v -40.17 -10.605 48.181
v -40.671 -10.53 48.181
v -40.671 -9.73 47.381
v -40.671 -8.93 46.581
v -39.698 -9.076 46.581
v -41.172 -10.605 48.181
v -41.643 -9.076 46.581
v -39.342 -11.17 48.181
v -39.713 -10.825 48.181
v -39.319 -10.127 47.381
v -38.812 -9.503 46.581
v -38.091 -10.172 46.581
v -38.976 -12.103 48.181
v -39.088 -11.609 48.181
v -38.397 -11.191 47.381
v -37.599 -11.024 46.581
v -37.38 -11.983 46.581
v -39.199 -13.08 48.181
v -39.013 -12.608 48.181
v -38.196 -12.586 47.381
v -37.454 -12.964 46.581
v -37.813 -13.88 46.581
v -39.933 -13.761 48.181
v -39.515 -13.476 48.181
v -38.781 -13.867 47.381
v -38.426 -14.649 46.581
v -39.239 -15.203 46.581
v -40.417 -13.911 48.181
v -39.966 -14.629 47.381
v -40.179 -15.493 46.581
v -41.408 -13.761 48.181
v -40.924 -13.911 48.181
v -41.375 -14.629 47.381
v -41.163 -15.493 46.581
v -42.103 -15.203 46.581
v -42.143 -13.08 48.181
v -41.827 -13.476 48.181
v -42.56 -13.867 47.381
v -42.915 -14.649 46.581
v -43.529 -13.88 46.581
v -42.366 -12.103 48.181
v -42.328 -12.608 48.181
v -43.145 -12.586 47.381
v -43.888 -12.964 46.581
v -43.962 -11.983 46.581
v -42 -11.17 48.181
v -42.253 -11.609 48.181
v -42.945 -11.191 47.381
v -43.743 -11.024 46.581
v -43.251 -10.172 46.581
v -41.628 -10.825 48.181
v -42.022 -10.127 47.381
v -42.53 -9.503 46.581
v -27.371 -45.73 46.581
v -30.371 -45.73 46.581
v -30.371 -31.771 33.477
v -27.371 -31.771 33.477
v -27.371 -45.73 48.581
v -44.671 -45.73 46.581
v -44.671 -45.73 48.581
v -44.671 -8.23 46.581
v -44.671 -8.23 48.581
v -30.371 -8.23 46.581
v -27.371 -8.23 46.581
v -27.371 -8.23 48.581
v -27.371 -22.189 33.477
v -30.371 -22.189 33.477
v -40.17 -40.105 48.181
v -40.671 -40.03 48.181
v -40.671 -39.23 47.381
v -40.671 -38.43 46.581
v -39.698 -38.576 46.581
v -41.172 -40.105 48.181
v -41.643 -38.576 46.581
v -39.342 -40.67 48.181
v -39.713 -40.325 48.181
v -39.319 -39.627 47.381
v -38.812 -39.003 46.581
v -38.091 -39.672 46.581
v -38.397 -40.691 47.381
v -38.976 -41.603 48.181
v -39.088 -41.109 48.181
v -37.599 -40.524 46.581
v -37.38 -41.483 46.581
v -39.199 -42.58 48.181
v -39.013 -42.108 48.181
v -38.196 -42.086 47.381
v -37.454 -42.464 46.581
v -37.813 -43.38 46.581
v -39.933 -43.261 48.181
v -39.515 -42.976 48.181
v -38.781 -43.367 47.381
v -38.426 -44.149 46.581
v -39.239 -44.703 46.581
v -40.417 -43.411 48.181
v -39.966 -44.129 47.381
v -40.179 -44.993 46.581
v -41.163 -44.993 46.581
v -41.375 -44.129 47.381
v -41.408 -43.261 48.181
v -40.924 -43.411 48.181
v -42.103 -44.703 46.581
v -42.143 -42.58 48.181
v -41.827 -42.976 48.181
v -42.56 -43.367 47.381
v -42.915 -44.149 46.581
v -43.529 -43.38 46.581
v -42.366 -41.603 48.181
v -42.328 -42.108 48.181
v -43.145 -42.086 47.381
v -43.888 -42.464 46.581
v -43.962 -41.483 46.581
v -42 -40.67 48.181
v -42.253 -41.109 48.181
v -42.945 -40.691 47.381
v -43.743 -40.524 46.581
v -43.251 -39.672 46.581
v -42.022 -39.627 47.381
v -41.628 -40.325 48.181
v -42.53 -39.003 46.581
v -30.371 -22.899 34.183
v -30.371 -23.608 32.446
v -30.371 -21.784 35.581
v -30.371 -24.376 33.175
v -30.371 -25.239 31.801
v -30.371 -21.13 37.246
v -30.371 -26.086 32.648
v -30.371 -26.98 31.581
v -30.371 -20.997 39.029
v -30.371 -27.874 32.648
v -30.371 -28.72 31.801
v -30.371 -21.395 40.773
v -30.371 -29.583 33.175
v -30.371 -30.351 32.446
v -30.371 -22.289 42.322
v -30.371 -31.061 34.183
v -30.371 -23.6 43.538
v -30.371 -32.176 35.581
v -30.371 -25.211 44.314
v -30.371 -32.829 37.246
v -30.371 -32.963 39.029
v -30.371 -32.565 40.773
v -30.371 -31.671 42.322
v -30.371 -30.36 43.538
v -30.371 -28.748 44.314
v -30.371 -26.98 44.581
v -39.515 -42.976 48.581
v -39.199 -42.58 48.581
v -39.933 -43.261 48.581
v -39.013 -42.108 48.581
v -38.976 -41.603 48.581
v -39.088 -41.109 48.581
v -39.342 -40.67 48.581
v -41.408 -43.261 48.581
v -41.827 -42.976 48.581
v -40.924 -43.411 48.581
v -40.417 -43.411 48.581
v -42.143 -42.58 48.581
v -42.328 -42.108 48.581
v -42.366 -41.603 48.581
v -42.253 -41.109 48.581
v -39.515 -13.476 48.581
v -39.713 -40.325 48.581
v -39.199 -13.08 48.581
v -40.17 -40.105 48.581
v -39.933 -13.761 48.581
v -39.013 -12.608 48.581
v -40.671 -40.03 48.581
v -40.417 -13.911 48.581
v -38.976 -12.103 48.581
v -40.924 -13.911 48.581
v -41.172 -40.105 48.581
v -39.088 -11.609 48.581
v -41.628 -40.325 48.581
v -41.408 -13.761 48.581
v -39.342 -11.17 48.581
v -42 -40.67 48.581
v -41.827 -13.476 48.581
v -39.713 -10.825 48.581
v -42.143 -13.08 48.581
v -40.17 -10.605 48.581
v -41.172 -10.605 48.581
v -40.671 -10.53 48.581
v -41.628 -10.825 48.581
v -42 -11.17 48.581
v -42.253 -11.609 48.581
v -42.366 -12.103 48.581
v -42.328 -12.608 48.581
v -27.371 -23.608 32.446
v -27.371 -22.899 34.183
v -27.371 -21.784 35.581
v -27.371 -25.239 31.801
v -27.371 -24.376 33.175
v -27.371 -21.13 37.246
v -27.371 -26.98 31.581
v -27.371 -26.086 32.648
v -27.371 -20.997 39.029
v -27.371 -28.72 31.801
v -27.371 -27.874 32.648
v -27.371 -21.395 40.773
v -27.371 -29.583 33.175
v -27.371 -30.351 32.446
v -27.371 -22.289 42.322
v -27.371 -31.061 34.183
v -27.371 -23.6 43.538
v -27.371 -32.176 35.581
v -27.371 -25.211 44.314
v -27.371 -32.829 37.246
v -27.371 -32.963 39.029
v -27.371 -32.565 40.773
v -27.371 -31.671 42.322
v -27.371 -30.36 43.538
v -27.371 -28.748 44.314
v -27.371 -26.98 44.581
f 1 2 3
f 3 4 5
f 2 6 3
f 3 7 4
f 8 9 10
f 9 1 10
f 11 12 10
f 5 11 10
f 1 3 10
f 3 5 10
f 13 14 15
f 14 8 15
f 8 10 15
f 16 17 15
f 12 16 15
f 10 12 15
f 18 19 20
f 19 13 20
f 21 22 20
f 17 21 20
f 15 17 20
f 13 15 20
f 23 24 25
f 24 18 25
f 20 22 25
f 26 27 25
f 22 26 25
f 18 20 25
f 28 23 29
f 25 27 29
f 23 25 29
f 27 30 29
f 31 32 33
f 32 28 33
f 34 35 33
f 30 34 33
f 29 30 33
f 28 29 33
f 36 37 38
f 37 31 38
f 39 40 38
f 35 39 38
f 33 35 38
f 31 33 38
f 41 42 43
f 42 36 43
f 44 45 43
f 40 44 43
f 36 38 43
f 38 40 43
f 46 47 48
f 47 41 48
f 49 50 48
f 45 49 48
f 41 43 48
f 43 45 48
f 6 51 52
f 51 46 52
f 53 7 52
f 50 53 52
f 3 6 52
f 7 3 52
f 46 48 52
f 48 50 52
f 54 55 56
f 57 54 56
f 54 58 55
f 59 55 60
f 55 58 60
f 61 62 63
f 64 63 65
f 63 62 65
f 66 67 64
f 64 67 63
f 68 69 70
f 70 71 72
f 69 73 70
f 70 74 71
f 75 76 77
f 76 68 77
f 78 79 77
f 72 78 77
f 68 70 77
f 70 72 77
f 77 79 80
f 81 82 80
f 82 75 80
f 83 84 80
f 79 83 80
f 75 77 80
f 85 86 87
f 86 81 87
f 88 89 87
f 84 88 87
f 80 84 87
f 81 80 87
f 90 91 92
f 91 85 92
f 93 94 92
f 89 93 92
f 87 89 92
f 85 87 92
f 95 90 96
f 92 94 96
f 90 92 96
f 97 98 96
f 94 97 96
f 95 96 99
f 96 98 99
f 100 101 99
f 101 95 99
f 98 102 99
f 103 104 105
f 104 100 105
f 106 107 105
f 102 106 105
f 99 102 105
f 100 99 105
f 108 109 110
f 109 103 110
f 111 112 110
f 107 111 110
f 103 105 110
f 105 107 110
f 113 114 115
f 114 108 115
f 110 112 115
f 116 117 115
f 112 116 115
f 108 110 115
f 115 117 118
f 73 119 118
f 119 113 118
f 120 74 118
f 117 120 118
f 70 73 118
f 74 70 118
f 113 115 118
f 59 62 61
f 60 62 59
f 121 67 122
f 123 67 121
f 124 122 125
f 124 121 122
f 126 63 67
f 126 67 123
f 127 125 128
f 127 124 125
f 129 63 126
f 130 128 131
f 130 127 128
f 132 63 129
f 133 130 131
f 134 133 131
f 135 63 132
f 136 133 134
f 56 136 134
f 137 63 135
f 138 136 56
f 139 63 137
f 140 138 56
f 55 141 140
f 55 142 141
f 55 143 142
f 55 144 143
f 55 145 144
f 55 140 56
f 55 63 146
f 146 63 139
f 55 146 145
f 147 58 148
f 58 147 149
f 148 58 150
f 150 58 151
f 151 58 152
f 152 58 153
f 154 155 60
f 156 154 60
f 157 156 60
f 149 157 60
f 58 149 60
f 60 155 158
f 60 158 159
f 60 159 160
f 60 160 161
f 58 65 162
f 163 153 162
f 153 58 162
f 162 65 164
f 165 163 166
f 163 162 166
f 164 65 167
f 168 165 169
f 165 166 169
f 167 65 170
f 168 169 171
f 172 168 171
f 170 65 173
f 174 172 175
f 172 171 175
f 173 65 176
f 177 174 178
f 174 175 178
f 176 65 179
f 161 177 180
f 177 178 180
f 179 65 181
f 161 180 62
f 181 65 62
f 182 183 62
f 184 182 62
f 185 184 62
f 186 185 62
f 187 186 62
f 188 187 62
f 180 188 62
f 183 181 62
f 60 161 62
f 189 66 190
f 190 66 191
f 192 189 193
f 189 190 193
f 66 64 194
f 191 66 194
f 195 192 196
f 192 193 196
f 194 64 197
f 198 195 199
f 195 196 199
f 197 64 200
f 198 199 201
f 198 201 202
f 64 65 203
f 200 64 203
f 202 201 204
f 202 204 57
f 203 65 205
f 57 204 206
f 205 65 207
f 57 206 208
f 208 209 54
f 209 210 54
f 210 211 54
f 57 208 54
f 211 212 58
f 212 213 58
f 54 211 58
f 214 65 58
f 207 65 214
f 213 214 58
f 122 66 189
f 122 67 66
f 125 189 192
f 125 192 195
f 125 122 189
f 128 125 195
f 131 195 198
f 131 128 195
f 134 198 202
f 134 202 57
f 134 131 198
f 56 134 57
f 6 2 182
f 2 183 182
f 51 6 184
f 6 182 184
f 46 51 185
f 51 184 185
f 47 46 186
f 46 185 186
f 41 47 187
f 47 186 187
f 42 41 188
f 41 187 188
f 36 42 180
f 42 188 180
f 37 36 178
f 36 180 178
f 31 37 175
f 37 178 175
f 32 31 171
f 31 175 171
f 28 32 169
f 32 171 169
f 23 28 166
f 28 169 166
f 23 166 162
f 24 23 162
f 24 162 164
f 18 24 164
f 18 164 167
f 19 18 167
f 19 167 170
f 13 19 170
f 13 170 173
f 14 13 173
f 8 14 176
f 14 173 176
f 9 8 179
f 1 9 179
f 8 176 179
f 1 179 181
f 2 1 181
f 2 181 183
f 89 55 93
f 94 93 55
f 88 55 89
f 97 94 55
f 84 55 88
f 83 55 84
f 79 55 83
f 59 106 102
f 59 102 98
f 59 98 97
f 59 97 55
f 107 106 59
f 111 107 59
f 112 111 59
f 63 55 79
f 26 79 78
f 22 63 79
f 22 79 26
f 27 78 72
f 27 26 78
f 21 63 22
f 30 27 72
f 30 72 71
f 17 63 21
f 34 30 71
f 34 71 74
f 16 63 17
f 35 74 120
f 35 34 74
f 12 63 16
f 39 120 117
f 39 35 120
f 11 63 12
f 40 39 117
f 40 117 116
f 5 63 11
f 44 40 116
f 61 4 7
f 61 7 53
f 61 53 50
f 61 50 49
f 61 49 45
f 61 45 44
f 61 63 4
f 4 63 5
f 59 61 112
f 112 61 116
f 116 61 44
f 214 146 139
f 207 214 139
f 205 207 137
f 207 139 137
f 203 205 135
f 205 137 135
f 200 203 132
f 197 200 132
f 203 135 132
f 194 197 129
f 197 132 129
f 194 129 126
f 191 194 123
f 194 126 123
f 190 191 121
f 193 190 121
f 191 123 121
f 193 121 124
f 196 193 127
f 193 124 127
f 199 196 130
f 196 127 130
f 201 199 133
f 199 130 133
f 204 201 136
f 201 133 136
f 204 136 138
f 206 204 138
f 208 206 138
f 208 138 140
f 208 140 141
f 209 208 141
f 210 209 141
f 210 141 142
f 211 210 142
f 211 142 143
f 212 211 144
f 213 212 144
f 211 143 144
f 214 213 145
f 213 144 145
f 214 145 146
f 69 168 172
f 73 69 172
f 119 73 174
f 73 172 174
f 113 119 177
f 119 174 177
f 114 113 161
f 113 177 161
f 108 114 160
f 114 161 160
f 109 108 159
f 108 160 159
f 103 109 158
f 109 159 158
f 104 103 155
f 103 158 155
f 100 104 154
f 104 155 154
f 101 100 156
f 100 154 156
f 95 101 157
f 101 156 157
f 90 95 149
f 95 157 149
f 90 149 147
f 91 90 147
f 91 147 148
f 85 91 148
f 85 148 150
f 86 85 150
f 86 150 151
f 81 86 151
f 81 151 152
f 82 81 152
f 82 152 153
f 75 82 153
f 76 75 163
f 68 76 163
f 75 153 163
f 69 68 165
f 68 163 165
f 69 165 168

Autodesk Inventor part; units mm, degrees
ref_plane "YZ Plane" through (0, 0, 0) normal (1, 0, 0) x (0, 1, 0)
ref_plane "XZ Plane" through (0, 0, 0) normal (0, 1, 0) x (-1, 0, 0)
ref_plane "XY Plane" through (0, 0, 0) normal (0, 0, 1) x (1, 0, 0)
ref_plane "Work Plane1" through (-14.6708, -27.7298, 48.581) normal (0, 0, -1) x (-1, 0, 0)
sketch "Sketch1" plane through (-14.6708, -27.7298, 48.581) normal (0, 0, -1) x (-1, 0, 0)
  circle A0 centre (26, 15.5) radius 3.3 projected
  circle A1 centre (26, -14) radius 3.3 projected
  line L0 (12.7, 19.5) -> (30, 19.5)
  line L1 (30, 19.5) -> (30, -18)
  line L2 (30, -18) -> (12.7, -18)
  line L3 (12.7, -18) -> (12.7, 19.5)
  line L4 (15.7, 19.5) -> (15.7, -18)
  point P0 (-14.6708, 27.7298)
  dimension "d0" = 4
  dimension "d1" = 4
  dimension "d2" = 4
  dimension "d3" = 10
  dimension "d4" = 3
extrude "Extrusion1" add sketch "Sketch1" along normal blind 2 contours A0 | A1 | L0 L4 L2 L3 | L0 L1 L2 L4
sketch "Sketch2" plane through (-14.6708, -27.7298, 46.581) normal (0, 0, -1) x (-1, 0, 0)
  line L0 (15.7, 19.5) -> (15.7, -18) projected
  line L1 (12.7, 19.5) -> (12.7, -18) projected
  circle A0 centre (26, 15.5) radius 3.3 projected
  circle A1 centre (26, -14) radius 3.3 projected
  line L2 (30, 19.5) -> (12.7, 19.5) projected
  line L3 (12.7, -18) -> (30, -18) projected
  point P0 (-14.6708, 27.7298)
hole "Hole1" at (-40.6708, -12.2298, 46.581) at (-40.6708, -41.7298, 46.581) direction (0, 0, 1) diameter 3.4 end through all countersink diameter 6.6 countersink angle 90 clearance for "Countersunk Head GOST 12876-67" size "M3" standard "GOST"
sketch "Sketch3" plane through (-14.6708, -27.7298, 46.581) normal (0, 0, -1) x (-1, 0, 0)
  line L0 (30, 19.5) -> (12.7, 19.5) projected
  line L1 (12.7, 19.5) -> (12.7, -18) projected
  line L2 (15.7, 19.5) -> (15.7, -18) projected
  line L3 (12.7, -18) -> (30, -18) projected
  point P0 (-14.6708, 27.7298)
extrude "Extrusion2" add sketch "Sketch3" along normal blind 62.25
sketch "Sketch4" plane through (-30.3708, -45.7298, 46.581) normal (-1, 0, 0) x (0, 0, 1)
  line L0 (2, 0) -> (-62.25, 0) projected
  line L1 (-8, 0) -> (-8, 37.5) construction
  line L2 (0, 37.5) -> (-62.25, 37.5) projected
  circle A0 centre (-8, 18.75) radius 7
  line L3 (0, 37.5) -> (0, 0) projected
  circle A1 centre (-8, 18.75) radius 6
  line L4 (0, 0) -> (-13.1037, 13.9591)
  line L5 (-13.1037, 23.5409) -> (0, 37.5)
  line L6 (-62.25, 0) -> (-62.25, 37.5) projected
  point P0 (-46.581, 45.7298)
  dimension "d16" = 14
  dimension "d17" = 8
  dimension "d18" = 12
extrude "Extrusion3" cut sketch "Sketch4" against normal through all contours L0 L6 L2 L5 A0 L4 | A1
properties part number "tumbler_holder"
